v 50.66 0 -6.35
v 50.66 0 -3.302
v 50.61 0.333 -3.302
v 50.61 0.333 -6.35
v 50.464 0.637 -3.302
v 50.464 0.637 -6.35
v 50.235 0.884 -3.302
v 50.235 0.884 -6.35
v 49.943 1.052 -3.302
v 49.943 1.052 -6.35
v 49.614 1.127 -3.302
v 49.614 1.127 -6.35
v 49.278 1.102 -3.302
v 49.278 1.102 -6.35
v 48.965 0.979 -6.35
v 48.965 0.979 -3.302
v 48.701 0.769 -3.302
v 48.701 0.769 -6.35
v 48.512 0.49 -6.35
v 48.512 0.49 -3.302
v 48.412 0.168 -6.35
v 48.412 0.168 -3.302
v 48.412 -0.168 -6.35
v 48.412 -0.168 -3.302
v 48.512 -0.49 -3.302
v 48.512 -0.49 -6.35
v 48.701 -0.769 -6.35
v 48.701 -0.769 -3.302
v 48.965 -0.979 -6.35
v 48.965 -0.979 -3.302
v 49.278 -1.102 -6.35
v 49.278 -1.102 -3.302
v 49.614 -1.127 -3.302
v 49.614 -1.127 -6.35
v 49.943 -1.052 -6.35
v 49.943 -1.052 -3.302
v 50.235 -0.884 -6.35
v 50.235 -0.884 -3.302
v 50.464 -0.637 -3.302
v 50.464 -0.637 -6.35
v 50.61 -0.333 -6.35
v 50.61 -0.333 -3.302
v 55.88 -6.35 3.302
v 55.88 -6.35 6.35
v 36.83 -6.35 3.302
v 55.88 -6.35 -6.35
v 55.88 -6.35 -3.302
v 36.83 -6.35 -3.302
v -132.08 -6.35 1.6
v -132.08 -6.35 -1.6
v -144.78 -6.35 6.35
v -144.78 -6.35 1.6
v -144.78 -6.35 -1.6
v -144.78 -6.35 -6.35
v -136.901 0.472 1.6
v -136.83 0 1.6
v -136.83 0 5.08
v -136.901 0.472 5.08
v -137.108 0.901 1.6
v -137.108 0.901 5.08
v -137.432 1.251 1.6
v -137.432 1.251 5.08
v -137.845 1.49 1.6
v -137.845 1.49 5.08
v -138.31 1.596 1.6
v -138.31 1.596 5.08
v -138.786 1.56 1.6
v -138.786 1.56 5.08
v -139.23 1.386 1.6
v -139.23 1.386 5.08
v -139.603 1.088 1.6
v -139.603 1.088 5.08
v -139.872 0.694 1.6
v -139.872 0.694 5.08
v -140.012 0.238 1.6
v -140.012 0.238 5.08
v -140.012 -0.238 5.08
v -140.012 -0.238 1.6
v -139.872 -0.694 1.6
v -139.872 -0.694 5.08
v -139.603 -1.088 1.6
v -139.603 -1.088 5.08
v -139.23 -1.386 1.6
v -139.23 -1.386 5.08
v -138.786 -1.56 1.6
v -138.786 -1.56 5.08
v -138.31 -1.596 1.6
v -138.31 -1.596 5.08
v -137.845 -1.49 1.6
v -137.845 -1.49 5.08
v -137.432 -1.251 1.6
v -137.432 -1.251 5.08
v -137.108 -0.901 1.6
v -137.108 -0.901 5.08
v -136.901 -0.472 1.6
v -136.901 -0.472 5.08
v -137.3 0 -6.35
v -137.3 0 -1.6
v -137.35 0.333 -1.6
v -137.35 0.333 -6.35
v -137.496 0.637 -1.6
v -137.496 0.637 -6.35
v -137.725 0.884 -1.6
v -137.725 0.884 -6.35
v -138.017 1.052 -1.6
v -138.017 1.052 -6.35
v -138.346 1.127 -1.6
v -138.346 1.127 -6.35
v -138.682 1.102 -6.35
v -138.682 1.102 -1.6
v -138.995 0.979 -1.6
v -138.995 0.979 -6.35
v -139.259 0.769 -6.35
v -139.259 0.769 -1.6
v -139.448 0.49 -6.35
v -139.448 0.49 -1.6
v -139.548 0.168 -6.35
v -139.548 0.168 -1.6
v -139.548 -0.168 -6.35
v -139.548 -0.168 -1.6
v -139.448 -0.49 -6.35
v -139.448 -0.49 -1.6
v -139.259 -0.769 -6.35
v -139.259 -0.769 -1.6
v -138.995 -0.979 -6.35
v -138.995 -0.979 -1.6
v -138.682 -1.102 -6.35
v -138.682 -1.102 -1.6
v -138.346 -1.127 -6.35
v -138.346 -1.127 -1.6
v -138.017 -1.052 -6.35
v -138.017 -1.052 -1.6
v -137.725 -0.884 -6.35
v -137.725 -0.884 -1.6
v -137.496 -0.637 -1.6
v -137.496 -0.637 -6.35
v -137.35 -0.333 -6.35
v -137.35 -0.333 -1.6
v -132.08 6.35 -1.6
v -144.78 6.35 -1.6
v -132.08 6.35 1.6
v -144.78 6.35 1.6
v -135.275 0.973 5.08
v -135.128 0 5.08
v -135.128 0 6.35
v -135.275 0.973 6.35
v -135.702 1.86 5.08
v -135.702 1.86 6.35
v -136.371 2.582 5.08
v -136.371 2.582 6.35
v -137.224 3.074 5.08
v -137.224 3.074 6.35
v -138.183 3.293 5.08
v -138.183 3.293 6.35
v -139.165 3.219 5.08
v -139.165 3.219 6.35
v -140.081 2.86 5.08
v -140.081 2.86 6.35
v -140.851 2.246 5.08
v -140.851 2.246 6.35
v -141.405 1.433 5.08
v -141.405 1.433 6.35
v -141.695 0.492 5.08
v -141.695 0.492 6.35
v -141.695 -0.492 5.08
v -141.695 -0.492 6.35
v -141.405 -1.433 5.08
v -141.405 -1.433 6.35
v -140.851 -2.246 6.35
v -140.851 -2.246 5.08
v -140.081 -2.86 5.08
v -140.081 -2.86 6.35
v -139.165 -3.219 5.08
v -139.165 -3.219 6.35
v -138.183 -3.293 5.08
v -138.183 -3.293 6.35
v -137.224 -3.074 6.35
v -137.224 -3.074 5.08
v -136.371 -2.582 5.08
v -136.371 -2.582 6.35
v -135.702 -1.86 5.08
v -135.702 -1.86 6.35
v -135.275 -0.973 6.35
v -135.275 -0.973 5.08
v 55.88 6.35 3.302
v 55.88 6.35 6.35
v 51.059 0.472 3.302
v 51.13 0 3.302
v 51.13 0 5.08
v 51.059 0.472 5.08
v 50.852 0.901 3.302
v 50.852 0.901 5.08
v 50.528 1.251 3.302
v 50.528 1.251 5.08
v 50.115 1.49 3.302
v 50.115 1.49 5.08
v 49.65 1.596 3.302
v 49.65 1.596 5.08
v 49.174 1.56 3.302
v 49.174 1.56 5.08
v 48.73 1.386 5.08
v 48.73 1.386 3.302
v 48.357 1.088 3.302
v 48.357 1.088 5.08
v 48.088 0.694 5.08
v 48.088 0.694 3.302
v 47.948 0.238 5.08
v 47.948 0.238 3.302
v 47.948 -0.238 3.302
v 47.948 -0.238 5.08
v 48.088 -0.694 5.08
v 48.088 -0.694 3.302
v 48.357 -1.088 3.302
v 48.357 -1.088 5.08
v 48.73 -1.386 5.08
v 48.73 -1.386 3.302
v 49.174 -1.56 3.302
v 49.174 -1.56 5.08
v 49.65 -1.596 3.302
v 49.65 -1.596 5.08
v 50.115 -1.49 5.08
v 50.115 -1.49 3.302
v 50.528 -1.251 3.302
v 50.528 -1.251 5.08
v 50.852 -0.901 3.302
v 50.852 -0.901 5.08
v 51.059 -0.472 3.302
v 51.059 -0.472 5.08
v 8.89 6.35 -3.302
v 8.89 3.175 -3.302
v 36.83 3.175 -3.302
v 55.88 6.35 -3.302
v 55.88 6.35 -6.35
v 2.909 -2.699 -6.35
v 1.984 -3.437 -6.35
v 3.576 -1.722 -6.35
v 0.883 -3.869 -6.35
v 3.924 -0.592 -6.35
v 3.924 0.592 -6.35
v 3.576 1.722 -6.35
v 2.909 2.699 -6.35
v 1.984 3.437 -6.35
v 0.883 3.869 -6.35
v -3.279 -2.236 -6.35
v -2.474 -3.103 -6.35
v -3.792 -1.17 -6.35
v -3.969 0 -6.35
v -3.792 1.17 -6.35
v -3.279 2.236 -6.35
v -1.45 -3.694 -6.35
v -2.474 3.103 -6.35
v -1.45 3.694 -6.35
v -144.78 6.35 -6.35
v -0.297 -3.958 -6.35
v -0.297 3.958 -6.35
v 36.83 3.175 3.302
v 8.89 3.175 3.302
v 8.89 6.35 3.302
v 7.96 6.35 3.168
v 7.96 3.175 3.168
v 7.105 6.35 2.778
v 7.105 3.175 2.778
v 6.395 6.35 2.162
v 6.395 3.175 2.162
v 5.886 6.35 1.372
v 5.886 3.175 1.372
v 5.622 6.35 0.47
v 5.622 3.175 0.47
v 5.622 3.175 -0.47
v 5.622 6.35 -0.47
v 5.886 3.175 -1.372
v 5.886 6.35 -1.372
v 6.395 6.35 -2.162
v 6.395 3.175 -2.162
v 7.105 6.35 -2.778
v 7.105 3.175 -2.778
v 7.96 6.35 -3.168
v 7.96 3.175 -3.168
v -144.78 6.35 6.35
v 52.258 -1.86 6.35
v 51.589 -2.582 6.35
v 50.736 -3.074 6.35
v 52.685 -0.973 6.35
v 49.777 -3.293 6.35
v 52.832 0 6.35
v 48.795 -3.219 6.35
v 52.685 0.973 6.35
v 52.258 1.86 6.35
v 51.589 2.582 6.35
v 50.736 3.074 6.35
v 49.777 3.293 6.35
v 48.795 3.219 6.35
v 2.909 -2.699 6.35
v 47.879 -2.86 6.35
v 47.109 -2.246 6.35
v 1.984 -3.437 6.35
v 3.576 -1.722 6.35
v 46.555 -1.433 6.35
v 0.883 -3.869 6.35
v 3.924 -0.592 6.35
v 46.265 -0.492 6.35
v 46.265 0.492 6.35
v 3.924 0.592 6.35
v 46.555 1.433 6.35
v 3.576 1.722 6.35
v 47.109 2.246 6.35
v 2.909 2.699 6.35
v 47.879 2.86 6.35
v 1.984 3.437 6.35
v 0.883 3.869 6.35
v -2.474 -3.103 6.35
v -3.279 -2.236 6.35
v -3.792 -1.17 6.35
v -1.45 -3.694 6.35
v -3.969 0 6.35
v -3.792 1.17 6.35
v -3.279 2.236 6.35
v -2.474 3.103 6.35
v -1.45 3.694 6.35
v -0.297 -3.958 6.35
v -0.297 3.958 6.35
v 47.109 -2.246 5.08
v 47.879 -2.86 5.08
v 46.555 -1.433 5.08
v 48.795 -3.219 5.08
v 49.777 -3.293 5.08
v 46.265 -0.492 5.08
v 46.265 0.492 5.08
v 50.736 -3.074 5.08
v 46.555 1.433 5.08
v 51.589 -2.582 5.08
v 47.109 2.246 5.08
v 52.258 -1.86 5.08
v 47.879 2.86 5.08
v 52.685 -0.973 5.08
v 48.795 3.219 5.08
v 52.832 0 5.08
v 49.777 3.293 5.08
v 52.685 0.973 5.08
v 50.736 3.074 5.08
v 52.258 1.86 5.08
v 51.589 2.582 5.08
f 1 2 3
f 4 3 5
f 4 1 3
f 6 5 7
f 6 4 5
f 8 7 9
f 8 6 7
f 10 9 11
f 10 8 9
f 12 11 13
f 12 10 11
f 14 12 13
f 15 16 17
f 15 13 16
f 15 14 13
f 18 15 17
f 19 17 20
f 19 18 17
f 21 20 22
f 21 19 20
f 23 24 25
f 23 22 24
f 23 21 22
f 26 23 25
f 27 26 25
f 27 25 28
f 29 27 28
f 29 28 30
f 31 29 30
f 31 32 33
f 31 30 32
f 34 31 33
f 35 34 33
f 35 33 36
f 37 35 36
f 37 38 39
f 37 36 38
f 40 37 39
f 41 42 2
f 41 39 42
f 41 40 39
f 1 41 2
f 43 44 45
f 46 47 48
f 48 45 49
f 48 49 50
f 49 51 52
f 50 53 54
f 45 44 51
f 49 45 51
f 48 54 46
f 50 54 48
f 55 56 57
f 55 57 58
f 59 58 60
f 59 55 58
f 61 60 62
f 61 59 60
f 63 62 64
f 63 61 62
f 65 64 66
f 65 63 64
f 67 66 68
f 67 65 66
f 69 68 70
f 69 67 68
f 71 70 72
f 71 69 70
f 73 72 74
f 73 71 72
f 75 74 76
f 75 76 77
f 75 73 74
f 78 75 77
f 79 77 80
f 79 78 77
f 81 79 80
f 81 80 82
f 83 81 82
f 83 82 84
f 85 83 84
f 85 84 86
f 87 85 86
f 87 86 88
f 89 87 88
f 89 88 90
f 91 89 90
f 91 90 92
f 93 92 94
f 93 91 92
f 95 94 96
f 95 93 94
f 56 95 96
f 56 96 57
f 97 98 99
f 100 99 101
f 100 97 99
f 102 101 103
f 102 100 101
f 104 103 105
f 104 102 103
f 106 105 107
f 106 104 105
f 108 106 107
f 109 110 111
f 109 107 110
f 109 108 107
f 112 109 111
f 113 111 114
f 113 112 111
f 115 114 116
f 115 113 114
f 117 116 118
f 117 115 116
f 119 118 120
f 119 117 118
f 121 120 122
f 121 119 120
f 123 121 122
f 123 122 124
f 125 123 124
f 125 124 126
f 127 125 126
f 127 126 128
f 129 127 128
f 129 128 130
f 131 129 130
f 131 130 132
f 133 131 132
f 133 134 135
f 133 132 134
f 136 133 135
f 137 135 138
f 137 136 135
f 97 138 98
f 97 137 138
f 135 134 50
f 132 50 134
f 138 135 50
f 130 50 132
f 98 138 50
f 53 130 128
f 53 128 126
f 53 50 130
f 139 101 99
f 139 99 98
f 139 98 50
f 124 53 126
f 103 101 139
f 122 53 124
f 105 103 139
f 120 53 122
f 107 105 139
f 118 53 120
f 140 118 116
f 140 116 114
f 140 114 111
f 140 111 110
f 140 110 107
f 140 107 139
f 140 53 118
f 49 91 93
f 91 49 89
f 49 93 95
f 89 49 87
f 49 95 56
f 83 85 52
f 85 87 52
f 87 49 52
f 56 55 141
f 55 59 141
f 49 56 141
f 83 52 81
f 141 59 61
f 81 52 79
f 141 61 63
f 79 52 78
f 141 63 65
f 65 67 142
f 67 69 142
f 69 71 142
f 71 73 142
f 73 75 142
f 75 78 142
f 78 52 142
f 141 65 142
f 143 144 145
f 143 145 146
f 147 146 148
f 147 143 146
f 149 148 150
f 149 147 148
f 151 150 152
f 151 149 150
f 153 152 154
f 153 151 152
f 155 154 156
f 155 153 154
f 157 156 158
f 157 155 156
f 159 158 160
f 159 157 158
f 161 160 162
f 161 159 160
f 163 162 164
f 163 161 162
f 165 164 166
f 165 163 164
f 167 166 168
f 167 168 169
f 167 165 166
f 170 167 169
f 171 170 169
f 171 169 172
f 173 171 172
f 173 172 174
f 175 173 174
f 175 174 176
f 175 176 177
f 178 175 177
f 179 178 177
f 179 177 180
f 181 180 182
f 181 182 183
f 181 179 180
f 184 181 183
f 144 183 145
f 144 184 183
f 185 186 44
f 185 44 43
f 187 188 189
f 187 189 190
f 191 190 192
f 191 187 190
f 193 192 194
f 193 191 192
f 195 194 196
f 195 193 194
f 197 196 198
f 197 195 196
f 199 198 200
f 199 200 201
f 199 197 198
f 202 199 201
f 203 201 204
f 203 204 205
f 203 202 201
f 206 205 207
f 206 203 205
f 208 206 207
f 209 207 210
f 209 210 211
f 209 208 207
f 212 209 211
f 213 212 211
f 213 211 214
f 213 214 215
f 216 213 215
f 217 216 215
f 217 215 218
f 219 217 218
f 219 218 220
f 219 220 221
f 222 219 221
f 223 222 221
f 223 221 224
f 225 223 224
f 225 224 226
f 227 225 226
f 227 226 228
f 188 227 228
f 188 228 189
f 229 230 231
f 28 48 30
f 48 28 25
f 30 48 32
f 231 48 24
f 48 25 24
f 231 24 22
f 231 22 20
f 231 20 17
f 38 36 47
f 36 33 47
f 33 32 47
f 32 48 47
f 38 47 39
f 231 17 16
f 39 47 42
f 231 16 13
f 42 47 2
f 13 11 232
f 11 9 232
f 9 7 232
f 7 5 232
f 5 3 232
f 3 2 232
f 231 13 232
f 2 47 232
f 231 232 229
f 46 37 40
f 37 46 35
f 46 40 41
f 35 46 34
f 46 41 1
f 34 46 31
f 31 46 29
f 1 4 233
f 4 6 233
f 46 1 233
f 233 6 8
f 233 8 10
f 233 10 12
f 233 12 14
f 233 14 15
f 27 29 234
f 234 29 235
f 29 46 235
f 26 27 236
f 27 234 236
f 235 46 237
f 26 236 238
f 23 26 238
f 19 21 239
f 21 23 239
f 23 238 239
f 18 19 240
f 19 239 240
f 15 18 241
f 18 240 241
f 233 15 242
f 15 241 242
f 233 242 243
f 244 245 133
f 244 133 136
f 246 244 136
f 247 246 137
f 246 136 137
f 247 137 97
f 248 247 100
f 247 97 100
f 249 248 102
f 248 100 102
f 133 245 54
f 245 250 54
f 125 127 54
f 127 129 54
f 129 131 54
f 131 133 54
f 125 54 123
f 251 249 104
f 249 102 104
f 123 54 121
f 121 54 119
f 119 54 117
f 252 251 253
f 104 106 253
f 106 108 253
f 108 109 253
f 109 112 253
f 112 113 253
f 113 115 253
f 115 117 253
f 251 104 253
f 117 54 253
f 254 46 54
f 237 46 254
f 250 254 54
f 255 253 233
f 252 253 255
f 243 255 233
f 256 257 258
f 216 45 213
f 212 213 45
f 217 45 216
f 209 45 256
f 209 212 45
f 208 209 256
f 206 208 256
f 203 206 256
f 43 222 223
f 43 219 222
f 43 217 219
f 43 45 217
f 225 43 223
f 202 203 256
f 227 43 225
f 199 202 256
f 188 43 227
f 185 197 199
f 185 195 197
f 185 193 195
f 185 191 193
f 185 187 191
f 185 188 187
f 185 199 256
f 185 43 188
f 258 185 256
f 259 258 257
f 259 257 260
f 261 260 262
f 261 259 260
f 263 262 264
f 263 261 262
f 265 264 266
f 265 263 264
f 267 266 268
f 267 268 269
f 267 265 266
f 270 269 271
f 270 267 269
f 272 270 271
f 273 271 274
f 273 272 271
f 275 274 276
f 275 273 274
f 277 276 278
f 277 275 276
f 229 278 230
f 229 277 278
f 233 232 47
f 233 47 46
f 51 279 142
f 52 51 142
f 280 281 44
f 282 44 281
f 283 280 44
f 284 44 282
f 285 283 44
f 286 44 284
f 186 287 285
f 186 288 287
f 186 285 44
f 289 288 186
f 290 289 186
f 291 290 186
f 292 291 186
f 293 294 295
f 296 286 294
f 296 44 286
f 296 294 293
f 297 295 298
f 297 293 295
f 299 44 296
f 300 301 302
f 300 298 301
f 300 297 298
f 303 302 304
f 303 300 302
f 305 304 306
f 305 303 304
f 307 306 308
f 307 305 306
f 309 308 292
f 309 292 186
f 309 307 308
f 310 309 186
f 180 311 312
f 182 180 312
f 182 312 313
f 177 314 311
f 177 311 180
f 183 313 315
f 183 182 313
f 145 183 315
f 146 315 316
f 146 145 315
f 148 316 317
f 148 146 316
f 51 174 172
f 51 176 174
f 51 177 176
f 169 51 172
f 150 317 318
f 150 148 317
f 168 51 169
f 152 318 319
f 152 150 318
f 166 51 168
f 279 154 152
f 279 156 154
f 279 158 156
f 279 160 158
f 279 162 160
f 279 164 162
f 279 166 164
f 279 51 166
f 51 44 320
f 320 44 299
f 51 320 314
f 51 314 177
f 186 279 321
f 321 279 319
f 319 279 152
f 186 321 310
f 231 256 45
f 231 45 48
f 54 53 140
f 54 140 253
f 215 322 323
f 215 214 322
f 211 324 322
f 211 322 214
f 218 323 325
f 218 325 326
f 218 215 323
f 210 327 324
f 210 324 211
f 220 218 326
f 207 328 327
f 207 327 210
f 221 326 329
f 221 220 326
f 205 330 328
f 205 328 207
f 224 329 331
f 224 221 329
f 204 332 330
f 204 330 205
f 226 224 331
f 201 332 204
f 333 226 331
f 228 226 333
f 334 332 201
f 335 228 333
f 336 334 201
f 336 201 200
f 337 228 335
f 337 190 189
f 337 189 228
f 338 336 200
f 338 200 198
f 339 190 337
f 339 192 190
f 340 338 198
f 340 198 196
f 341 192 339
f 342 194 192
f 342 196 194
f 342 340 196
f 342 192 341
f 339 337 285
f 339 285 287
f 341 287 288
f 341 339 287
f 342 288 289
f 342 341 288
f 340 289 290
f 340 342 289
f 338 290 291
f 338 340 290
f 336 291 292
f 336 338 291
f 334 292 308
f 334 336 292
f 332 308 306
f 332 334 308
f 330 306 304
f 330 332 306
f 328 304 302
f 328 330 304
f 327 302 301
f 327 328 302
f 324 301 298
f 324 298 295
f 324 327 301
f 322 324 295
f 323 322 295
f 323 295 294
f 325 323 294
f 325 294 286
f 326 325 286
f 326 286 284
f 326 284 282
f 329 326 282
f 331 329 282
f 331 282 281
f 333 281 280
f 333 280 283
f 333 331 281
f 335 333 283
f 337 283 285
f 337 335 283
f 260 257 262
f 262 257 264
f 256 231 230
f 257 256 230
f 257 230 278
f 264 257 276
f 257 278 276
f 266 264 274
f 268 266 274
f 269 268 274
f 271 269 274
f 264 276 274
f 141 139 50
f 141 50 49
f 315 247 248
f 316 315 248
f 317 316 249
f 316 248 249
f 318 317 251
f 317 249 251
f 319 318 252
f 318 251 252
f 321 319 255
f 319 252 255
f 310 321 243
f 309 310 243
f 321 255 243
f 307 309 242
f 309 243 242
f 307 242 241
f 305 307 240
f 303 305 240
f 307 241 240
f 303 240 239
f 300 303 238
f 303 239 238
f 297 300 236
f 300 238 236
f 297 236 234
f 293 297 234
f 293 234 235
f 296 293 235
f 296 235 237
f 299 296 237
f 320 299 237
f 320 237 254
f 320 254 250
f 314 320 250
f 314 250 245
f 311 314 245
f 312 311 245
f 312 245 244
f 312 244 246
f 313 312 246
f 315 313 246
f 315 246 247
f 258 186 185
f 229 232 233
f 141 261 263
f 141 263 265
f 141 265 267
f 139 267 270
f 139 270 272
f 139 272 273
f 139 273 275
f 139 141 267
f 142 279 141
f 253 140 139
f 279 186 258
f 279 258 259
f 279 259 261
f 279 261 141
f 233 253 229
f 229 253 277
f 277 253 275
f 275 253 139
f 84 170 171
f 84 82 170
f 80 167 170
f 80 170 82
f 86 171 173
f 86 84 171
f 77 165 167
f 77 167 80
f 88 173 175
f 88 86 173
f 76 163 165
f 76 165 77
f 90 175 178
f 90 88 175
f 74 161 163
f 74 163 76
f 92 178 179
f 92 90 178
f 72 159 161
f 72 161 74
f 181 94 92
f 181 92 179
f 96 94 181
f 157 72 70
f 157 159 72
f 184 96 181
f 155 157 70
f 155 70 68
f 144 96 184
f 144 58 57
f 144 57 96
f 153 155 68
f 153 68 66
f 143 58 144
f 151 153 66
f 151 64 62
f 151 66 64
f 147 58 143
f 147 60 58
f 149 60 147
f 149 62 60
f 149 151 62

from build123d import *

# Parameters (mm, degrees)
BOSS_EXTRUDE1_DEPTH            = 55.88
BOSS_EXTRUDE1_DEPTH_BACK       = 144.78
SKETCH1_W                      = 12.7
SKETCH1_H                      = 12.7
F_5_16_0_3125_DIAMETER_HOLE2_D = 7.9375
SKETCH9_W                      = 6.604
SKETCH9_H                      = 12.7
CUT_EXTRUDE1_DEPTH             = 19.05
SKETCH19_W                     = 3.2004
SKETCH19_H                     = 12.7
CUT_EXTRUDE2_DEPTH             = 12.7
ADVANCEDHOLE2_START            = 5.08
ADVANCEDHOLE2_OUTLINE_R        = 3.302
ADVANCEDHOLE2_DEPTH            = 1.27
ADVANCEDHOLE2_START_2          = -6.35
ADVANCEDHOLE2_2_OUTLINE_R      = 1.1303
ADVANCEDHOLE2_2_DEPTH          = 11.43
ADVANCEDHOLE2_START_3          = 1.6002
ADVANCEDHOLE2_3_OUTLINE_R      = 1.6002
ADVANCEDHOLE2_3_OUTLINE_R_2    = 1.1303
ADVANCEDHOLE2_3_DEPTH          = 3.4798
CUT_EXTRUDE3_DEPTH             = 3.175


# Read off the part's stored shape, not the designer's step: AdvancedHole2
with BuildPart() as part:
    # Sketch1 → Boss-Extrude1 (new, two sides: drawn at the far end of the back side and taken through both)
    with BuildSketch(Plane(origin=(0, 0, 0), x_dir=(0, 0, -1), z_dir=(1, 0, 0)).offset(-BOSS_EXTRUDE1_DEPTH_BACK)):
        Rectangle(SKETCH1_W, SKETCH1_H)
    extrude(amount=BOSS_EXTRUDE1_DEPTH + BOSS_EXTRUDE1_DEPTH_BACK)

    # 5/16 (0.3125) Diameter Hole2 (through all)
    with Locations(Plane.XY.offset(6.35)):
        with Locations((0, 0)):
            Hole(F_5_16_0_3125_DIAMETER_HOLE2_D / 2)

    # Sketch9 → Cut-Extrude1 (cut)
    with BuildSketch(Plane(origin=(55.88, 0, 0), x_dir=(0, 0, -1), z_dir=(1, 0, 0))):
        Rectangle(SKETCH9_W, SKETCH9_H)
    extrude(amount=-CUT_EXTRUDE1_DEPTH, mode=Mode.SUBTRACT)

    # Sketch19 → Cut-Extrude2 (cut)
    with BuildSketch(Plane.ZY.offset(144.78)):
        Rectangle(SKETCH19_W, SKETCH19_H)
    extrude(amount=-CUT_EXTRUDE2_DEPTH, mode=Mode.SUBTRACT)

    # AdvancedHole2 outline → AdvancedHole2 (cut)
    with BuildSketch(Plane.XY.offset(ADVANCEDHOLE2_START)):
        with Locations((-138.43, 0)):
            Circle(ADVANCEDHOLE2_OUTLINE_R)
        with Locations((49.53, 0)):
            Circle(ADVANCEDHOLE2_OUTLINE_R)
    extrude(amount=ADVANCEDHOLE2_DEPTH, mode=Mode.SUBTRACT)

    # AdvancedHole2 2 outline → AdvancedHole2 2 (cut)
    with BuildSketch(Plane.XY.offset(ADVANCEDHOLE2_START_2)):
        with Locations((-138.43, 0)):
            Circle(ADVANCEDHOLE2_2_OUTLINE_R)
        with Locations((49.53, 0)):
            Circle(ADVANCEDHOLE2_2_OUTLINE_R)
    extrude(amount=ADVANCEDHOLE2_2_DEPTH, mode=Mode.SUBTRACT)

    # AdvancedHole2 3 outline → AdvancedHole2 3 (cut)
    # profile 1 of 2: a face of its own
    with BuildSketch(Plane.XY.offset(ADVANCEDHOLE2_START_3)):
        with Locations((-138.43, 0)):
            Circle(ADVANCEDHOLE2_3_OUTLINE_R)
        with Locations((-138.43, 0)):
            Circle(ADVANCEDHOLE2_3_OUTLINE_R_2, mode=Mode.SUBTRACT)
    # profile 2 of 2: a face of its own
    with BuildSketch(Plane.XY.offset(ADVANCEDHOLE2_START_3)):
        with Locations((49.53, 0)):
            Circle(ADVANCEDHOLE2_3_OUTLINE_R)
        with Locations((49.53, 0)):
            Circle(ADVANCEDHOLE2_3_OUTLINE_R_2, mode=Mode.SUBTRACT)
    extrude(amount=ADVANCEDHOLE2_3_DEPTH, mode=Mode.SUBTRACT)

    # Sketch20 → Cut-Extrude3 (cut)
    with BuildSketch(Plane(origin=(0, 6.35, 0), x_dir=(1, 0, 0), z_dir=(0, 1, 0))):
        with BuildLine():
            Line((36.83, -3.302), (8.89, -3.302))
            ThreePointArc((8.89, -3.302), (5.588, 0), (8.89, 3.302))
            Line((8.89, 3.302), (36.83, 3.302))
            ThreePointArc((36.83, 3.302), (40.132, 0), (36.83, -3.302))
        make_face()
    extrude(amount=-CUT_EXTRUDE3_DEPTH, mode=Mode.SUBTRACT)


solid = part.part
